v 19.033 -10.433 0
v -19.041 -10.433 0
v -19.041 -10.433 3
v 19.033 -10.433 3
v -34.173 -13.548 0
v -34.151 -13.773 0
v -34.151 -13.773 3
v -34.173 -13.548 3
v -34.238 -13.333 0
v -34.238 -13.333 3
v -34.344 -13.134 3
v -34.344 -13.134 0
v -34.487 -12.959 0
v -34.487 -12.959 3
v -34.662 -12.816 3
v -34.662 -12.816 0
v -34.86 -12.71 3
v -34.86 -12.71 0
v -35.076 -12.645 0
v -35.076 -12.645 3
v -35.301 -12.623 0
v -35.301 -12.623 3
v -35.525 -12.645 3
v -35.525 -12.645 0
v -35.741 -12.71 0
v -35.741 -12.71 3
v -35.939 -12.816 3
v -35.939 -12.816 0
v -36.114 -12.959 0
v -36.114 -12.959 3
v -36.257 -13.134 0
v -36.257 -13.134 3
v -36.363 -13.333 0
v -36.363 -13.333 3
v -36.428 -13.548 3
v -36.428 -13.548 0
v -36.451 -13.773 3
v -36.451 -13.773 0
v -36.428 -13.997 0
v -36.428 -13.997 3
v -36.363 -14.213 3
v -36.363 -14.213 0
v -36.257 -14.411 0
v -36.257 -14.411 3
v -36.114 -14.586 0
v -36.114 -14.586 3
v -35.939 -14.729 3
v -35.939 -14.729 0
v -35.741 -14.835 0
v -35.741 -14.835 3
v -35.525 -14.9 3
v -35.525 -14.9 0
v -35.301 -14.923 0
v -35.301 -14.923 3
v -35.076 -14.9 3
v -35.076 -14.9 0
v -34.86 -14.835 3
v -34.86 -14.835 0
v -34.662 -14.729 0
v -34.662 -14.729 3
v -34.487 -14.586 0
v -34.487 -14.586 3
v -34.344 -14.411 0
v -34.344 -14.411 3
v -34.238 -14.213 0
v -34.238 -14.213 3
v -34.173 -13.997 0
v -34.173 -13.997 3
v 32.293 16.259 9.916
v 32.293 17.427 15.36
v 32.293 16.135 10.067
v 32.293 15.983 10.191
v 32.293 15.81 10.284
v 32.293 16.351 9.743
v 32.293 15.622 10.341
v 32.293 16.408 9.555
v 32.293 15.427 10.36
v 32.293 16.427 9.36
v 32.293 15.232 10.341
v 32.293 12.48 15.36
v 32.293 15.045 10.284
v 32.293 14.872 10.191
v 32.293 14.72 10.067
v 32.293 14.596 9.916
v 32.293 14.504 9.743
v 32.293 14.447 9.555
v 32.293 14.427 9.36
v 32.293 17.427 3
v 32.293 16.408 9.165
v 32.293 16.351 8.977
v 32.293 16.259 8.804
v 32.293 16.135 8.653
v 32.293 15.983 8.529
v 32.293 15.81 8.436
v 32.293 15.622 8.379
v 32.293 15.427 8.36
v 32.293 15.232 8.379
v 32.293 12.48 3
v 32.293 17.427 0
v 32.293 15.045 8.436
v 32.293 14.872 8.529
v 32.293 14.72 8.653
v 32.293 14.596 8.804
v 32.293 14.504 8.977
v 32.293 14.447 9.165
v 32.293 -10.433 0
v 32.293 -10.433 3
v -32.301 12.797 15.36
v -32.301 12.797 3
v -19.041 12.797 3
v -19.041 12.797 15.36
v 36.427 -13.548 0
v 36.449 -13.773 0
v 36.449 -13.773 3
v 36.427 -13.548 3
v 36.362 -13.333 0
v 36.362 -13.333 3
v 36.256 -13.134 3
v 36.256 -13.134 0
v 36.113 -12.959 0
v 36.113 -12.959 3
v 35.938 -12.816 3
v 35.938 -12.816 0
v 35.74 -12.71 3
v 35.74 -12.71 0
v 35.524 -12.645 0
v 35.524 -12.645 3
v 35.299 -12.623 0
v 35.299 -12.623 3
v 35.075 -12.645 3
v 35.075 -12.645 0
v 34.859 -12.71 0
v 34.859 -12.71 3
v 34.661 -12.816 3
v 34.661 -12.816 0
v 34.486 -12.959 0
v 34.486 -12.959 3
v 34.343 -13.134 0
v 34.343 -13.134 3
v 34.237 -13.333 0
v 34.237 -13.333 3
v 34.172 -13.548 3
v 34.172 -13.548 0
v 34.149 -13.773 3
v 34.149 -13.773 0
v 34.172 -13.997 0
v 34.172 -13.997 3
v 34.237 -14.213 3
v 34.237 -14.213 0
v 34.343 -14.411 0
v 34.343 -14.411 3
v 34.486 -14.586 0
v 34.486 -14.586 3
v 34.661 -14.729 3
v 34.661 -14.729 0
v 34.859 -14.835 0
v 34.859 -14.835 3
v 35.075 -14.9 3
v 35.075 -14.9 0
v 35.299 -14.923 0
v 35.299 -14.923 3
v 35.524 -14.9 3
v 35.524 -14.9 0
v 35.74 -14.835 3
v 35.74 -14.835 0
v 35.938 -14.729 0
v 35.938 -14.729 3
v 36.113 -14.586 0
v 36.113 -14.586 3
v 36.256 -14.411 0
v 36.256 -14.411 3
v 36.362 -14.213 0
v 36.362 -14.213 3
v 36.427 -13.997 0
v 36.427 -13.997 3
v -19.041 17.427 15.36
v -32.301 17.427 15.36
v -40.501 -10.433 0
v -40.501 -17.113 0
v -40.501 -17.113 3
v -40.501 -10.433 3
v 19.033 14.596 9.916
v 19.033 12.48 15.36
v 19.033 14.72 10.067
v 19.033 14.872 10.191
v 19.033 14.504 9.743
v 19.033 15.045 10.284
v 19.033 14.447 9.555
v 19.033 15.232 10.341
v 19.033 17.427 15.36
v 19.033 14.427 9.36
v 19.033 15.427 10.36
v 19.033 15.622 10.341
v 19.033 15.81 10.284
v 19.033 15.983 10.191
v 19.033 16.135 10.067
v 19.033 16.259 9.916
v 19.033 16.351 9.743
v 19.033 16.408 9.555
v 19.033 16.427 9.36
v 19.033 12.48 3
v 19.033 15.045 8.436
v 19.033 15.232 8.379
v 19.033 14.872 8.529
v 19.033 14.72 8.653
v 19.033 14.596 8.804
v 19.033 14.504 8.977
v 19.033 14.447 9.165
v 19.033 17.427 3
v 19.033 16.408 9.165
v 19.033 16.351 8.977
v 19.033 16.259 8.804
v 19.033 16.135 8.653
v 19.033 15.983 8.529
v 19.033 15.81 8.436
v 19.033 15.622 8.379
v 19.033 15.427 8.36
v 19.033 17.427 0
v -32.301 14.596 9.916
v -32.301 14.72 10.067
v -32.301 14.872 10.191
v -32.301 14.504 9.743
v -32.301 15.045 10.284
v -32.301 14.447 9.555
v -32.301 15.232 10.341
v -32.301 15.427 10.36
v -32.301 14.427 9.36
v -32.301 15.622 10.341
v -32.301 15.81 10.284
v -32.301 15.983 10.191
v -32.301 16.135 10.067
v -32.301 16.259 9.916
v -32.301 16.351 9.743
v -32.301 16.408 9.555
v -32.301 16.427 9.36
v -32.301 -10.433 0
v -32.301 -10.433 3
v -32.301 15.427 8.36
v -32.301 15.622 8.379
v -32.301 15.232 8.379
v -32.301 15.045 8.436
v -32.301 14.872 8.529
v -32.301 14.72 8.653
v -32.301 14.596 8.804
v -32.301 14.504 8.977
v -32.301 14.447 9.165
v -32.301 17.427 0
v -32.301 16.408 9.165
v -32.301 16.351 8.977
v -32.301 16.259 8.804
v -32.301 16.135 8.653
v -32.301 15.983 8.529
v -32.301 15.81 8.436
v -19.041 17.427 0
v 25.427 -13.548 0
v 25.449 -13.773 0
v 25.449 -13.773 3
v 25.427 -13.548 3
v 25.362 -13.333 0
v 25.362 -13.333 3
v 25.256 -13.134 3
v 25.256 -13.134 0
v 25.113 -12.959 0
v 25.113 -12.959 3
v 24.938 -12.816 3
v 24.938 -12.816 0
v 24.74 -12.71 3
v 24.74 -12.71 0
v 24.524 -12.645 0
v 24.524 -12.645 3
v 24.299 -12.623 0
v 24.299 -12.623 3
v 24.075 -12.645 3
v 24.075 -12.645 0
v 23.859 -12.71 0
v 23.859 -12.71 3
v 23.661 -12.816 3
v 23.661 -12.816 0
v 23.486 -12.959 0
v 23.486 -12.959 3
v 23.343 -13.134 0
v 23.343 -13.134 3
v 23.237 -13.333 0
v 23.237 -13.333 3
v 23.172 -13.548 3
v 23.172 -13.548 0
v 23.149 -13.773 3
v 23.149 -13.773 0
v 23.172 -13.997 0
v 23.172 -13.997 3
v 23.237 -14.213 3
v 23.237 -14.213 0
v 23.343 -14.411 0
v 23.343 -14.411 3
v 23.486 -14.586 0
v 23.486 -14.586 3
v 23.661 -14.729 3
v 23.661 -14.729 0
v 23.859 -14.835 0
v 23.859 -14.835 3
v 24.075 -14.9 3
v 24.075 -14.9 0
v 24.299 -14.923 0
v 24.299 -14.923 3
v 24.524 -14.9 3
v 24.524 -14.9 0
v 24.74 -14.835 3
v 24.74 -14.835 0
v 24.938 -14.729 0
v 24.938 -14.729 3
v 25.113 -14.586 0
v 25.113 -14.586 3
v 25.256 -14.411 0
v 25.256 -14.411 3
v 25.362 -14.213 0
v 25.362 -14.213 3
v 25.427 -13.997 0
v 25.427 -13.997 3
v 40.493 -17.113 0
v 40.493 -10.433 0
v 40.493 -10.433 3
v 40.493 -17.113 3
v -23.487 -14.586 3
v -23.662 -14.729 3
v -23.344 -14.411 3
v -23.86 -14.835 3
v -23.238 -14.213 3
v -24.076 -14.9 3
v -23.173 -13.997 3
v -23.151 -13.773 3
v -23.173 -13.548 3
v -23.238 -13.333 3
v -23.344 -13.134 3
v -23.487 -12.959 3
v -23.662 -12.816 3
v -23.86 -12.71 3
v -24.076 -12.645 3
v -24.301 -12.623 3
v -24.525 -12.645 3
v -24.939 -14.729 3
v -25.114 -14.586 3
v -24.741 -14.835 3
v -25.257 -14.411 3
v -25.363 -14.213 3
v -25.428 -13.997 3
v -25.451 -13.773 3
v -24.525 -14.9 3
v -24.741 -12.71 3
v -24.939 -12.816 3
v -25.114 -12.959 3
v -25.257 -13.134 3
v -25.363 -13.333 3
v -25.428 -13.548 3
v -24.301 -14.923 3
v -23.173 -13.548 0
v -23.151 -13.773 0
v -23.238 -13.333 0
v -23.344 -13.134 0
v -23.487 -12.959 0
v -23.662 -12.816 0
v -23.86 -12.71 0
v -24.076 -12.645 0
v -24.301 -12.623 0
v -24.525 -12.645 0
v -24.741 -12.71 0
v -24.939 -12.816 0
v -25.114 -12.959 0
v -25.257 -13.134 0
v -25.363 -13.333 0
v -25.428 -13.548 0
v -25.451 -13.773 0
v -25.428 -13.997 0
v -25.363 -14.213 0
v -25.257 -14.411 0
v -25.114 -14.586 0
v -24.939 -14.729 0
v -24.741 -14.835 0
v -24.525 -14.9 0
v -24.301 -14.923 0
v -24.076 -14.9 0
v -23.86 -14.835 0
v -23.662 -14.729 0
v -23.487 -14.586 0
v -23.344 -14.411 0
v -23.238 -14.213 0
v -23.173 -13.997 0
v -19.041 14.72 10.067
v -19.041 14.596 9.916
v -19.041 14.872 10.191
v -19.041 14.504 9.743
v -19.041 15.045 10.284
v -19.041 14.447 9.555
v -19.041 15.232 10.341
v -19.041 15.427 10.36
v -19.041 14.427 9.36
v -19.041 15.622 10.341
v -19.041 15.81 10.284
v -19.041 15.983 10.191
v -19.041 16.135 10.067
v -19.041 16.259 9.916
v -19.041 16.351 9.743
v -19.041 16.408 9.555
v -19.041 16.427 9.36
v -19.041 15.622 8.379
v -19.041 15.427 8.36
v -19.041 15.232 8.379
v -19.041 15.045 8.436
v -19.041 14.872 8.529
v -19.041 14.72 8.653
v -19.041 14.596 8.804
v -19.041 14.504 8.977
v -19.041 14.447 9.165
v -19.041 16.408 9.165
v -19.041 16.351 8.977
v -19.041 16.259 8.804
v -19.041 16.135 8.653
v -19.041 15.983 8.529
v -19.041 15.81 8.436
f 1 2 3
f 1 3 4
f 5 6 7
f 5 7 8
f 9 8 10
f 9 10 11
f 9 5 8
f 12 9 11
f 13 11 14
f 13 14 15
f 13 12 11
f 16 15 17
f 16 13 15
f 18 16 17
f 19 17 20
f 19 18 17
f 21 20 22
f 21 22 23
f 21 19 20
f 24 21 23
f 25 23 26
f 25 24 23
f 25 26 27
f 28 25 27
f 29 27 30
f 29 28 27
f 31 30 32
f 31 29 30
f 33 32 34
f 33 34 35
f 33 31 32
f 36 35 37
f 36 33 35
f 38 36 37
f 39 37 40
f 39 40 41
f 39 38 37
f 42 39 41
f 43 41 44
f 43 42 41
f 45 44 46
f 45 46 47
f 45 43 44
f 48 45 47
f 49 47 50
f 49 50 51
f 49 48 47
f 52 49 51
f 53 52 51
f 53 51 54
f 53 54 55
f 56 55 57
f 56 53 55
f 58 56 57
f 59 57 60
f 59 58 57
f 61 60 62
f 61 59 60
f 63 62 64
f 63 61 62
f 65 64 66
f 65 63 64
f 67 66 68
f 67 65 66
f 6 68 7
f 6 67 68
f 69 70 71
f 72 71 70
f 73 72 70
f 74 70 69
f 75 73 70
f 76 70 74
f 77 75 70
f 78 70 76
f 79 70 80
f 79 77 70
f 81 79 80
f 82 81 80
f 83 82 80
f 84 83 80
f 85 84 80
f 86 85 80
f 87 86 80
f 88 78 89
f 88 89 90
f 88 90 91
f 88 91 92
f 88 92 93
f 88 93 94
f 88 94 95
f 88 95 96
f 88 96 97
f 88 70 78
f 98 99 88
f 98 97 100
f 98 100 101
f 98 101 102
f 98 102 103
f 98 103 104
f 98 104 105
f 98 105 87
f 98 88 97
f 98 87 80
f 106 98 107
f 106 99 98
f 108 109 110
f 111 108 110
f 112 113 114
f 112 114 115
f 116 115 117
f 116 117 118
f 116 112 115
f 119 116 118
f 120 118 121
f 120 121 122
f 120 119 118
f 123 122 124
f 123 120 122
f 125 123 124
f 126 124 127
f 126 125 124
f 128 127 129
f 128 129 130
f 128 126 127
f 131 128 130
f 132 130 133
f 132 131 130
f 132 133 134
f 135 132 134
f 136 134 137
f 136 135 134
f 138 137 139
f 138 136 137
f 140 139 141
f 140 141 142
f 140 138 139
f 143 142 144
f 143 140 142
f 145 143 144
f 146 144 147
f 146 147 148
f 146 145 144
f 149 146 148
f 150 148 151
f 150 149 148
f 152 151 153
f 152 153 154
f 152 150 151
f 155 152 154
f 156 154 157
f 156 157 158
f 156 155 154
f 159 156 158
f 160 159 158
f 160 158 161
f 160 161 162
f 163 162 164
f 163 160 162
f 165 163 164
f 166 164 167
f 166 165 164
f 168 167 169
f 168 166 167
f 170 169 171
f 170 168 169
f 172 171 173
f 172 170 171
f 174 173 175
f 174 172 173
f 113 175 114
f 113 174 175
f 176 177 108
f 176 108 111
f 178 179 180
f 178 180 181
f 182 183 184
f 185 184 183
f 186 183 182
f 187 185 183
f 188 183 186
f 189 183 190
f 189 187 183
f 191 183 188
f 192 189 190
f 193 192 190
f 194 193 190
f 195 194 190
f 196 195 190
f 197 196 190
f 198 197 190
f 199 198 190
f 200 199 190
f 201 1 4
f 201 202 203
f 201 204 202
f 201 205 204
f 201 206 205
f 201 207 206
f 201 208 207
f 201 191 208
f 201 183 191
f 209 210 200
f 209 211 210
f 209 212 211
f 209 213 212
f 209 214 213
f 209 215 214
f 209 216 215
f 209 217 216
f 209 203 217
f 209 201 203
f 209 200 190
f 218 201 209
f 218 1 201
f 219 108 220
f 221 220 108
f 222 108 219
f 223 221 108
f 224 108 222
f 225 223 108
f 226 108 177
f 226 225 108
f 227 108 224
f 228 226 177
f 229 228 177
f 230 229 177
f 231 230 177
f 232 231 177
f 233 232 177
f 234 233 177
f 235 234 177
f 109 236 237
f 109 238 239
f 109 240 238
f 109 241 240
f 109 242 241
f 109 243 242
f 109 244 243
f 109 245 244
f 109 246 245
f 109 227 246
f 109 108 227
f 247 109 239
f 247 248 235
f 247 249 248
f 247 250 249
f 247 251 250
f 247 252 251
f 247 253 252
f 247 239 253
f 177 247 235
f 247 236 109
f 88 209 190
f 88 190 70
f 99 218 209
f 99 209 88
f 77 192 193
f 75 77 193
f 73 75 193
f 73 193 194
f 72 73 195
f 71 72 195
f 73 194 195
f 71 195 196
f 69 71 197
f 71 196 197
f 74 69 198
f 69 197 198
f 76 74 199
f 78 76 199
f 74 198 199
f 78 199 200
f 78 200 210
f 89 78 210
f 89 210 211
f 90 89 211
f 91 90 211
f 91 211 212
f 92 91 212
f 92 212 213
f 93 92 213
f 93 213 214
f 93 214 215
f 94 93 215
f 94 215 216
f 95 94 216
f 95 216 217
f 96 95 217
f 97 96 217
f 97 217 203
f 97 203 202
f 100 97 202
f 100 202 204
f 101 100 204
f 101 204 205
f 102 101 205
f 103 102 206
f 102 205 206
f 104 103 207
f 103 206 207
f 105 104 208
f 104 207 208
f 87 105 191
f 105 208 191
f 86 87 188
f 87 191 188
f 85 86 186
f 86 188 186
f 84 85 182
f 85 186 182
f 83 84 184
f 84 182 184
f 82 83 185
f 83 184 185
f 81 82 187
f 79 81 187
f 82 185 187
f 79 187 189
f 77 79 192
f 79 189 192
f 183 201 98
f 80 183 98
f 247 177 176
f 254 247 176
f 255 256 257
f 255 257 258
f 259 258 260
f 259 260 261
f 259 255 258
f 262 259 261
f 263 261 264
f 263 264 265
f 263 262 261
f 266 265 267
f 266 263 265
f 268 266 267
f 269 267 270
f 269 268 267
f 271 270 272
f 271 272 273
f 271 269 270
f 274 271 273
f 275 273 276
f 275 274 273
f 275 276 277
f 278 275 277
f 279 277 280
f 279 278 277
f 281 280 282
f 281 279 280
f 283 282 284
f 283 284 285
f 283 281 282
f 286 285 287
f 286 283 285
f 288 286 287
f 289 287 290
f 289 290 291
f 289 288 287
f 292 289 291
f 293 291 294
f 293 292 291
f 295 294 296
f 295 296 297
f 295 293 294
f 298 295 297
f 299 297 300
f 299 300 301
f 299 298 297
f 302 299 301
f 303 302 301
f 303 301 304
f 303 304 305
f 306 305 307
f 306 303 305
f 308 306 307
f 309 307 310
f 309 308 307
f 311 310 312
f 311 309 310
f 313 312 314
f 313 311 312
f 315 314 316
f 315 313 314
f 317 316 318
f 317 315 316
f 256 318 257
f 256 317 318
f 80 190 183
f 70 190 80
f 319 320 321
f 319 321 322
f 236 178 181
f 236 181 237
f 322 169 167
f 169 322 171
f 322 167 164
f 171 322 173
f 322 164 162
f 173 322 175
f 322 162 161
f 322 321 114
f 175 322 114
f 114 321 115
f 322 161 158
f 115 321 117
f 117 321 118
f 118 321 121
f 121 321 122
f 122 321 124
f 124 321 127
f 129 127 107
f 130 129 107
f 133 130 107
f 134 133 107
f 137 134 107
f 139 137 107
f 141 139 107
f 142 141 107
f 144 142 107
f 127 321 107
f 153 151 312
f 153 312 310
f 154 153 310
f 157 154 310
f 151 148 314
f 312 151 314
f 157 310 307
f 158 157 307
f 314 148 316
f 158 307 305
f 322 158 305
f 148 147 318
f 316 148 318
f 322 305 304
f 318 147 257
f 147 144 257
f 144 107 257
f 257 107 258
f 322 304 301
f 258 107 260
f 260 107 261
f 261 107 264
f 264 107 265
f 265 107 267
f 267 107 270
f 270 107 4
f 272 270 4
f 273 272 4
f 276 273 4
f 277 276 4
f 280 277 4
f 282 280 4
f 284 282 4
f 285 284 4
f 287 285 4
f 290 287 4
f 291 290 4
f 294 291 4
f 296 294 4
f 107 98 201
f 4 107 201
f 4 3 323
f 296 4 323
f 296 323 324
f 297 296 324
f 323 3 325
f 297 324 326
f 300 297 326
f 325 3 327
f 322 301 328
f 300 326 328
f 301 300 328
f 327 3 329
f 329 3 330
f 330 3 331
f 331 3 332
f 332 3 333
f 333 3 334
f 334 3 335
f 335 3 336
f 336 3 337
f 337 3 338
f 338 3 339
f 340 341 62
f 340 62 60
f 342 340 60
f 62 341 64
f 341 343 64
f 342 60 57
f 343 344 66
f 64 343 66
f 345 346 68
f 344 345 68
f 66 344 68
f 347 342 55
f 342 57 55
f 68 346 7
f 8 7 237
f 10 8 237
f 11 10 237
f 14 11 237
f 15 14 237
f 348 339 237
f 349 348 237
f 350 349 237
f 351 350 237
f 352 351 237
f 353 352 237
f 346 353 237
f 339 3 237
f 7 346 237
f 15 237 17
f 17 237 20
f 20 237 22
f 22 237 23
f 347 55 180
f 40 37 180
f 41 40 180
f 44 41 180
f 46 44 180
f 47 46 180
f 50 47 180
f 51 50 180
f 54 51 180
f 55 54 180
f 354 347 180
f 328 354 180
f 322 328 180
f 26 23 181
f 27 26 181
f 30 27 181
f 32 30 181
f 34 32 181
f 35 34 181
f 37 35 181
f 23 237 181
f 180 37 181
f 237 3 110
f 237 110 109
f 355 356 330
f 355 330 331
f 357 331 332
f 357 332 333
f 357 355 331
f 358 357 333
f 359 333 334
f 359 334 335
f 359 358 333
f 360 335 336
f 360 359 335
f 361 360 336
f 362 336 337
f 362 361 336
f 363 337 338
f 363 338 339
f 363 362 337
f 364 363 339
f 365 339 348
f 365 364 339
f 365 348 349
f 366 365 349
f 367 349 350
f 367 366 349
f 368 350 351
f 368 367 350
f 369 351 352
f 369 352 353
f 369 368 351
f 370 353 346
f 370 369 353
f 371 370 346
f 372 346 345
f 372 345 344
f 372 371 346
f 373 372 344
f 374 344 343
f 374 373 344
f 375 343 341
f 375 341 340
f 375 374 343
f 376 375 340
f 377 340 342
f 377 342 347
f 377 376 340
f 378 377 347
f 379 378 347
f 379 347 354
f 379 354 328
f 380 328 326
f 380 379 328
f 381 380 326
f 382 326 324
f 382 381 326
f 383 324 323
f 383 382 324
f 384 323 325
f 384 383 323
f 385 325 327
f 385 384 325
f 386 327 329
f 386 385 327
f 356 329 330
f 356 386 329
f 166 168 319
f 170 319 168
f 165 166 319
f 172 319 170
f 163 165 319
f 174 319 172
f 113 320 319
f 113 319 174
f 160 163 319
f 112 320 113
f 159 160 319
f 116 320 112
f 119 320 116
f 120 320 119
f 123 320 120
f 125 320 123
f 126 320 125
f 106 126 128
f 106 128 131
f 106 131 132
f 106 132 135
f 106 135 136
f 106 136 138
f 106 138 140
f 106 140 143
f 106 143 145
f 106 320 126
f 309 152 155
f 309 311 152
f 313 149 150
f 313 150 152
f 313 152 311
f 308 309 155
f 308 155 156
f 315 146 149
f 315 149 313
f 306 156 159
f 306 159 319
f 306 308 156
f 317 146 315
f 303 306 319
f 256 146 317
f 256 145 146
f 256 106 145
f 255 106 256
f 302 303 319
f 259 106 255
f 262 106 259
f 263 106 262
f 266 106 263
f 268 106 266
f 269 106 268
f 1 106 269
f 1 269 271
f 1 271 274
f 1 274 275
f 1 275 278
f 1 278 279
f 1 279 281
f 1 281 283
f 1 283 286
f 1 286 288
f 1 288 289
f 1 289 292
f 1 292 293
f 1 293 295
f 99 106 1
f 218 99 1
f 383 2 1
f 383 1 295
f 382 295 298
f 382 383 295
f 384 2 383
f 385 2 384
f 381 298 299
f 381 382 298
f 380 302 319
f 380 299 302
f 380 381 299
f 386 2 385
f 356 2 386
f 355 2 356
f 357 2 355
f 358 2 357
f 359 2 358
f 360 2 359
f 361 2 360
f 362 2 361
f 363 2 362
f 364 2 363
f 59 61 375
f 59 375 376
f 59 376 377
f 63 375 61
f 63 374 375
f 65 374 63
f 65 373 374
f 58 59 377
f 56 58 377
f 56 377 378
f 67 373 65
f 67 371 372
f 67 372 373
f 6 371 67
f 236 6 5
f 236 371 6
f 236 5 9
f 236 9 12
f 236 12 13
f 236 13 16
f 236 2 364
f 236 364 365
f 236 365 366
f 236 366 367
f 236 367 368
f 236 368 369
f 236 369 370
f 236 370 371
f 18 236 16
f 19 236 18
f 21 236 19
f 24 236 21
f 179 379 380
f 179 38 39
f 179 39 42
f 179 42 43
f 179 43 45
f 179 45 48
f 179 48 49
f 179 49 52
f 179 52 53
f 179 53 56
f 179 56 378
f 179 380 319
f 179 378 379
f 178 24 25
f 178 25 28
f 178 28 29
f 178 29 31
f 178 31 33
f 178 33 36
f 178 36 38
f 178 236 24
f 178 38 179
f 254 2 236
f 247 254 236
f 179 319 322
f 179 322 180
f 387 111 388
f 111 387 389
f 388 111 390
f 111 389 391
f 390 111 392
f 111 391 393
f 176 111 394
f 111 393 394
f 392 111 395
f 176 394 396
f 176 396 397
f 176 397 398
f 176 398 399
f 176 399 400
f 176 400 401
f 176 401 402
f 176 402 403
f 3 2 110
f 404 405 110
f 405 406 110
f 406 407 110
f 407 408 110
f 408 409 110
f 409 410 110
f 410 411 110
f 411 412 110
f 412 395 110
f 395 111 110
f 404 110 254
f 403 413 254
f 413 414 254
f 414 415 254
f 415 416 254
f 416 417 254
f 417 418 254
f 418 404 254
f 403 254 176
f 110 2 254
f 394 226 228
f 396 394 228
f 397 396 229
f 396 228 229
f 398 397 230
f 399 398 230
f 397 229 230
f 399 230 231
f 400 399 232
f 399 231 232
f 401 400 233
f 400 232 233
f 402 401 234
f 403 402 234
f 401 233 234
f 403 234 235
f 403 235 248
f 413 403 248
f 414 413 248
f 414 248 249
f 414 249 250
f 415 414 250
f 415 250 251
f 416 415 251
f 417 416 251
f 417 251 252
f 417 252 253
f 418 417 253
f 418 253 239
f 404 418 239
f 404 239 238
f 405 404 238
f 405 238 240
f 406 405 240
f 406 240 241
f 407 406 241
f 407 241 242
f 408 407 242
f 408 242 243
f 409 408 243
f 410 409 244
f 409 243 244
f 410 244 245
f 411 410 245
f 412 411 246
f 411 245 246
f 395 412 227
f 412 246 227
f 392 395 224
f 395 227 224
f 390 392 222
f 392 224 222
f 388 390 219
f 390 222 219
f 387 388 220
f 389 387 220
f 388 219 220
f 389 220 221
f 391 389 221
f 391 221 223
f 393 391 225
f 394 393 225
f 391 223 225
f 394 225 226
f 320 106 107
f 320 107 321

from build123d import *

# Parameters (mm, degrees)
SKETCH_1_R          = 1.15
EXTRUDE_1_DEPTH     = 3
SKETCH_2_W          = 13.26
SKETCH_2_H          = 4.63
SKETCH_2_H_2        = 4.947868295
EXTRUDE_2_DEPTH     = 12.36
SKETCH_3_R          = 1
CUT_EXTRUDE_1_DEPTH = 100


with BuildPart() as part:
    # 草图1 → 凸台-拉伸1 (new body)
    with BuildSketch(Plane.XY):
        Polygon((-32.300556088, -10.432591376), (-32.300556088, 17.427408624), (-19.040556088, 17.427408624), (-19.040556088, -10.432591376), (19.033443912, -10.432591376), (19.033443912, 17.427408624), (32.293443912, 17.427408624), (32.293443912, -10.432591376), (40.493443912, -10.432591376), (40.493443912, -17.112591376), (-40.500556088, -17.112591376), (-40.500556088, -10.432591376), align=None)
        with Locations((-35.300556088, -13.772591376)):
            Circle(SKETCH_1_R, mode=Mode.SUBTRACT)
        with Locations((-24.300556088, -13.772591376)):
            Circle(SKETCH_1_R, mode=Mode.SUBTRACT)
        with Locations((24.299443912, -13.772591376)):
            Circle(SKETCH_1_R, mode=Mode.SUBTRACT)
        with Locations((35.299443912, -13.772591376)):
            Circle(SKETCH_1_R, mode=Mode.SUBTRACT)
    extrude(amount=EXTRUDE_1_DEPTH)

    # 草图2 → 凸台-拉伸2 (add)
    with BuildSketch(Plane.XY.offset(3)):
        with Locations((-25.670556088, 15.112408624)):
            Rectangle(SKETCH_2_W, SKETCH_2_H)
        with Locations((25.663443912, 14.953474477)):
            Rectangle(SKETCH_2_W, SKETCH_2_H_2)
    extrude(amount=EXTRUDE_2_DEPTH)

    # 草图3 → 切除-拉伸1 (cut)
    with BuildSketch(Plane.ZY.offset(32.300556088)):
        with Locations((9.36, 15.427408624)):
            Circle(SKETCH_3_R)
    extrude(amount=-CUT_EXTRUDE_1_DEPTH, mode=Mode.SUBTRACT)


solid = part.part
